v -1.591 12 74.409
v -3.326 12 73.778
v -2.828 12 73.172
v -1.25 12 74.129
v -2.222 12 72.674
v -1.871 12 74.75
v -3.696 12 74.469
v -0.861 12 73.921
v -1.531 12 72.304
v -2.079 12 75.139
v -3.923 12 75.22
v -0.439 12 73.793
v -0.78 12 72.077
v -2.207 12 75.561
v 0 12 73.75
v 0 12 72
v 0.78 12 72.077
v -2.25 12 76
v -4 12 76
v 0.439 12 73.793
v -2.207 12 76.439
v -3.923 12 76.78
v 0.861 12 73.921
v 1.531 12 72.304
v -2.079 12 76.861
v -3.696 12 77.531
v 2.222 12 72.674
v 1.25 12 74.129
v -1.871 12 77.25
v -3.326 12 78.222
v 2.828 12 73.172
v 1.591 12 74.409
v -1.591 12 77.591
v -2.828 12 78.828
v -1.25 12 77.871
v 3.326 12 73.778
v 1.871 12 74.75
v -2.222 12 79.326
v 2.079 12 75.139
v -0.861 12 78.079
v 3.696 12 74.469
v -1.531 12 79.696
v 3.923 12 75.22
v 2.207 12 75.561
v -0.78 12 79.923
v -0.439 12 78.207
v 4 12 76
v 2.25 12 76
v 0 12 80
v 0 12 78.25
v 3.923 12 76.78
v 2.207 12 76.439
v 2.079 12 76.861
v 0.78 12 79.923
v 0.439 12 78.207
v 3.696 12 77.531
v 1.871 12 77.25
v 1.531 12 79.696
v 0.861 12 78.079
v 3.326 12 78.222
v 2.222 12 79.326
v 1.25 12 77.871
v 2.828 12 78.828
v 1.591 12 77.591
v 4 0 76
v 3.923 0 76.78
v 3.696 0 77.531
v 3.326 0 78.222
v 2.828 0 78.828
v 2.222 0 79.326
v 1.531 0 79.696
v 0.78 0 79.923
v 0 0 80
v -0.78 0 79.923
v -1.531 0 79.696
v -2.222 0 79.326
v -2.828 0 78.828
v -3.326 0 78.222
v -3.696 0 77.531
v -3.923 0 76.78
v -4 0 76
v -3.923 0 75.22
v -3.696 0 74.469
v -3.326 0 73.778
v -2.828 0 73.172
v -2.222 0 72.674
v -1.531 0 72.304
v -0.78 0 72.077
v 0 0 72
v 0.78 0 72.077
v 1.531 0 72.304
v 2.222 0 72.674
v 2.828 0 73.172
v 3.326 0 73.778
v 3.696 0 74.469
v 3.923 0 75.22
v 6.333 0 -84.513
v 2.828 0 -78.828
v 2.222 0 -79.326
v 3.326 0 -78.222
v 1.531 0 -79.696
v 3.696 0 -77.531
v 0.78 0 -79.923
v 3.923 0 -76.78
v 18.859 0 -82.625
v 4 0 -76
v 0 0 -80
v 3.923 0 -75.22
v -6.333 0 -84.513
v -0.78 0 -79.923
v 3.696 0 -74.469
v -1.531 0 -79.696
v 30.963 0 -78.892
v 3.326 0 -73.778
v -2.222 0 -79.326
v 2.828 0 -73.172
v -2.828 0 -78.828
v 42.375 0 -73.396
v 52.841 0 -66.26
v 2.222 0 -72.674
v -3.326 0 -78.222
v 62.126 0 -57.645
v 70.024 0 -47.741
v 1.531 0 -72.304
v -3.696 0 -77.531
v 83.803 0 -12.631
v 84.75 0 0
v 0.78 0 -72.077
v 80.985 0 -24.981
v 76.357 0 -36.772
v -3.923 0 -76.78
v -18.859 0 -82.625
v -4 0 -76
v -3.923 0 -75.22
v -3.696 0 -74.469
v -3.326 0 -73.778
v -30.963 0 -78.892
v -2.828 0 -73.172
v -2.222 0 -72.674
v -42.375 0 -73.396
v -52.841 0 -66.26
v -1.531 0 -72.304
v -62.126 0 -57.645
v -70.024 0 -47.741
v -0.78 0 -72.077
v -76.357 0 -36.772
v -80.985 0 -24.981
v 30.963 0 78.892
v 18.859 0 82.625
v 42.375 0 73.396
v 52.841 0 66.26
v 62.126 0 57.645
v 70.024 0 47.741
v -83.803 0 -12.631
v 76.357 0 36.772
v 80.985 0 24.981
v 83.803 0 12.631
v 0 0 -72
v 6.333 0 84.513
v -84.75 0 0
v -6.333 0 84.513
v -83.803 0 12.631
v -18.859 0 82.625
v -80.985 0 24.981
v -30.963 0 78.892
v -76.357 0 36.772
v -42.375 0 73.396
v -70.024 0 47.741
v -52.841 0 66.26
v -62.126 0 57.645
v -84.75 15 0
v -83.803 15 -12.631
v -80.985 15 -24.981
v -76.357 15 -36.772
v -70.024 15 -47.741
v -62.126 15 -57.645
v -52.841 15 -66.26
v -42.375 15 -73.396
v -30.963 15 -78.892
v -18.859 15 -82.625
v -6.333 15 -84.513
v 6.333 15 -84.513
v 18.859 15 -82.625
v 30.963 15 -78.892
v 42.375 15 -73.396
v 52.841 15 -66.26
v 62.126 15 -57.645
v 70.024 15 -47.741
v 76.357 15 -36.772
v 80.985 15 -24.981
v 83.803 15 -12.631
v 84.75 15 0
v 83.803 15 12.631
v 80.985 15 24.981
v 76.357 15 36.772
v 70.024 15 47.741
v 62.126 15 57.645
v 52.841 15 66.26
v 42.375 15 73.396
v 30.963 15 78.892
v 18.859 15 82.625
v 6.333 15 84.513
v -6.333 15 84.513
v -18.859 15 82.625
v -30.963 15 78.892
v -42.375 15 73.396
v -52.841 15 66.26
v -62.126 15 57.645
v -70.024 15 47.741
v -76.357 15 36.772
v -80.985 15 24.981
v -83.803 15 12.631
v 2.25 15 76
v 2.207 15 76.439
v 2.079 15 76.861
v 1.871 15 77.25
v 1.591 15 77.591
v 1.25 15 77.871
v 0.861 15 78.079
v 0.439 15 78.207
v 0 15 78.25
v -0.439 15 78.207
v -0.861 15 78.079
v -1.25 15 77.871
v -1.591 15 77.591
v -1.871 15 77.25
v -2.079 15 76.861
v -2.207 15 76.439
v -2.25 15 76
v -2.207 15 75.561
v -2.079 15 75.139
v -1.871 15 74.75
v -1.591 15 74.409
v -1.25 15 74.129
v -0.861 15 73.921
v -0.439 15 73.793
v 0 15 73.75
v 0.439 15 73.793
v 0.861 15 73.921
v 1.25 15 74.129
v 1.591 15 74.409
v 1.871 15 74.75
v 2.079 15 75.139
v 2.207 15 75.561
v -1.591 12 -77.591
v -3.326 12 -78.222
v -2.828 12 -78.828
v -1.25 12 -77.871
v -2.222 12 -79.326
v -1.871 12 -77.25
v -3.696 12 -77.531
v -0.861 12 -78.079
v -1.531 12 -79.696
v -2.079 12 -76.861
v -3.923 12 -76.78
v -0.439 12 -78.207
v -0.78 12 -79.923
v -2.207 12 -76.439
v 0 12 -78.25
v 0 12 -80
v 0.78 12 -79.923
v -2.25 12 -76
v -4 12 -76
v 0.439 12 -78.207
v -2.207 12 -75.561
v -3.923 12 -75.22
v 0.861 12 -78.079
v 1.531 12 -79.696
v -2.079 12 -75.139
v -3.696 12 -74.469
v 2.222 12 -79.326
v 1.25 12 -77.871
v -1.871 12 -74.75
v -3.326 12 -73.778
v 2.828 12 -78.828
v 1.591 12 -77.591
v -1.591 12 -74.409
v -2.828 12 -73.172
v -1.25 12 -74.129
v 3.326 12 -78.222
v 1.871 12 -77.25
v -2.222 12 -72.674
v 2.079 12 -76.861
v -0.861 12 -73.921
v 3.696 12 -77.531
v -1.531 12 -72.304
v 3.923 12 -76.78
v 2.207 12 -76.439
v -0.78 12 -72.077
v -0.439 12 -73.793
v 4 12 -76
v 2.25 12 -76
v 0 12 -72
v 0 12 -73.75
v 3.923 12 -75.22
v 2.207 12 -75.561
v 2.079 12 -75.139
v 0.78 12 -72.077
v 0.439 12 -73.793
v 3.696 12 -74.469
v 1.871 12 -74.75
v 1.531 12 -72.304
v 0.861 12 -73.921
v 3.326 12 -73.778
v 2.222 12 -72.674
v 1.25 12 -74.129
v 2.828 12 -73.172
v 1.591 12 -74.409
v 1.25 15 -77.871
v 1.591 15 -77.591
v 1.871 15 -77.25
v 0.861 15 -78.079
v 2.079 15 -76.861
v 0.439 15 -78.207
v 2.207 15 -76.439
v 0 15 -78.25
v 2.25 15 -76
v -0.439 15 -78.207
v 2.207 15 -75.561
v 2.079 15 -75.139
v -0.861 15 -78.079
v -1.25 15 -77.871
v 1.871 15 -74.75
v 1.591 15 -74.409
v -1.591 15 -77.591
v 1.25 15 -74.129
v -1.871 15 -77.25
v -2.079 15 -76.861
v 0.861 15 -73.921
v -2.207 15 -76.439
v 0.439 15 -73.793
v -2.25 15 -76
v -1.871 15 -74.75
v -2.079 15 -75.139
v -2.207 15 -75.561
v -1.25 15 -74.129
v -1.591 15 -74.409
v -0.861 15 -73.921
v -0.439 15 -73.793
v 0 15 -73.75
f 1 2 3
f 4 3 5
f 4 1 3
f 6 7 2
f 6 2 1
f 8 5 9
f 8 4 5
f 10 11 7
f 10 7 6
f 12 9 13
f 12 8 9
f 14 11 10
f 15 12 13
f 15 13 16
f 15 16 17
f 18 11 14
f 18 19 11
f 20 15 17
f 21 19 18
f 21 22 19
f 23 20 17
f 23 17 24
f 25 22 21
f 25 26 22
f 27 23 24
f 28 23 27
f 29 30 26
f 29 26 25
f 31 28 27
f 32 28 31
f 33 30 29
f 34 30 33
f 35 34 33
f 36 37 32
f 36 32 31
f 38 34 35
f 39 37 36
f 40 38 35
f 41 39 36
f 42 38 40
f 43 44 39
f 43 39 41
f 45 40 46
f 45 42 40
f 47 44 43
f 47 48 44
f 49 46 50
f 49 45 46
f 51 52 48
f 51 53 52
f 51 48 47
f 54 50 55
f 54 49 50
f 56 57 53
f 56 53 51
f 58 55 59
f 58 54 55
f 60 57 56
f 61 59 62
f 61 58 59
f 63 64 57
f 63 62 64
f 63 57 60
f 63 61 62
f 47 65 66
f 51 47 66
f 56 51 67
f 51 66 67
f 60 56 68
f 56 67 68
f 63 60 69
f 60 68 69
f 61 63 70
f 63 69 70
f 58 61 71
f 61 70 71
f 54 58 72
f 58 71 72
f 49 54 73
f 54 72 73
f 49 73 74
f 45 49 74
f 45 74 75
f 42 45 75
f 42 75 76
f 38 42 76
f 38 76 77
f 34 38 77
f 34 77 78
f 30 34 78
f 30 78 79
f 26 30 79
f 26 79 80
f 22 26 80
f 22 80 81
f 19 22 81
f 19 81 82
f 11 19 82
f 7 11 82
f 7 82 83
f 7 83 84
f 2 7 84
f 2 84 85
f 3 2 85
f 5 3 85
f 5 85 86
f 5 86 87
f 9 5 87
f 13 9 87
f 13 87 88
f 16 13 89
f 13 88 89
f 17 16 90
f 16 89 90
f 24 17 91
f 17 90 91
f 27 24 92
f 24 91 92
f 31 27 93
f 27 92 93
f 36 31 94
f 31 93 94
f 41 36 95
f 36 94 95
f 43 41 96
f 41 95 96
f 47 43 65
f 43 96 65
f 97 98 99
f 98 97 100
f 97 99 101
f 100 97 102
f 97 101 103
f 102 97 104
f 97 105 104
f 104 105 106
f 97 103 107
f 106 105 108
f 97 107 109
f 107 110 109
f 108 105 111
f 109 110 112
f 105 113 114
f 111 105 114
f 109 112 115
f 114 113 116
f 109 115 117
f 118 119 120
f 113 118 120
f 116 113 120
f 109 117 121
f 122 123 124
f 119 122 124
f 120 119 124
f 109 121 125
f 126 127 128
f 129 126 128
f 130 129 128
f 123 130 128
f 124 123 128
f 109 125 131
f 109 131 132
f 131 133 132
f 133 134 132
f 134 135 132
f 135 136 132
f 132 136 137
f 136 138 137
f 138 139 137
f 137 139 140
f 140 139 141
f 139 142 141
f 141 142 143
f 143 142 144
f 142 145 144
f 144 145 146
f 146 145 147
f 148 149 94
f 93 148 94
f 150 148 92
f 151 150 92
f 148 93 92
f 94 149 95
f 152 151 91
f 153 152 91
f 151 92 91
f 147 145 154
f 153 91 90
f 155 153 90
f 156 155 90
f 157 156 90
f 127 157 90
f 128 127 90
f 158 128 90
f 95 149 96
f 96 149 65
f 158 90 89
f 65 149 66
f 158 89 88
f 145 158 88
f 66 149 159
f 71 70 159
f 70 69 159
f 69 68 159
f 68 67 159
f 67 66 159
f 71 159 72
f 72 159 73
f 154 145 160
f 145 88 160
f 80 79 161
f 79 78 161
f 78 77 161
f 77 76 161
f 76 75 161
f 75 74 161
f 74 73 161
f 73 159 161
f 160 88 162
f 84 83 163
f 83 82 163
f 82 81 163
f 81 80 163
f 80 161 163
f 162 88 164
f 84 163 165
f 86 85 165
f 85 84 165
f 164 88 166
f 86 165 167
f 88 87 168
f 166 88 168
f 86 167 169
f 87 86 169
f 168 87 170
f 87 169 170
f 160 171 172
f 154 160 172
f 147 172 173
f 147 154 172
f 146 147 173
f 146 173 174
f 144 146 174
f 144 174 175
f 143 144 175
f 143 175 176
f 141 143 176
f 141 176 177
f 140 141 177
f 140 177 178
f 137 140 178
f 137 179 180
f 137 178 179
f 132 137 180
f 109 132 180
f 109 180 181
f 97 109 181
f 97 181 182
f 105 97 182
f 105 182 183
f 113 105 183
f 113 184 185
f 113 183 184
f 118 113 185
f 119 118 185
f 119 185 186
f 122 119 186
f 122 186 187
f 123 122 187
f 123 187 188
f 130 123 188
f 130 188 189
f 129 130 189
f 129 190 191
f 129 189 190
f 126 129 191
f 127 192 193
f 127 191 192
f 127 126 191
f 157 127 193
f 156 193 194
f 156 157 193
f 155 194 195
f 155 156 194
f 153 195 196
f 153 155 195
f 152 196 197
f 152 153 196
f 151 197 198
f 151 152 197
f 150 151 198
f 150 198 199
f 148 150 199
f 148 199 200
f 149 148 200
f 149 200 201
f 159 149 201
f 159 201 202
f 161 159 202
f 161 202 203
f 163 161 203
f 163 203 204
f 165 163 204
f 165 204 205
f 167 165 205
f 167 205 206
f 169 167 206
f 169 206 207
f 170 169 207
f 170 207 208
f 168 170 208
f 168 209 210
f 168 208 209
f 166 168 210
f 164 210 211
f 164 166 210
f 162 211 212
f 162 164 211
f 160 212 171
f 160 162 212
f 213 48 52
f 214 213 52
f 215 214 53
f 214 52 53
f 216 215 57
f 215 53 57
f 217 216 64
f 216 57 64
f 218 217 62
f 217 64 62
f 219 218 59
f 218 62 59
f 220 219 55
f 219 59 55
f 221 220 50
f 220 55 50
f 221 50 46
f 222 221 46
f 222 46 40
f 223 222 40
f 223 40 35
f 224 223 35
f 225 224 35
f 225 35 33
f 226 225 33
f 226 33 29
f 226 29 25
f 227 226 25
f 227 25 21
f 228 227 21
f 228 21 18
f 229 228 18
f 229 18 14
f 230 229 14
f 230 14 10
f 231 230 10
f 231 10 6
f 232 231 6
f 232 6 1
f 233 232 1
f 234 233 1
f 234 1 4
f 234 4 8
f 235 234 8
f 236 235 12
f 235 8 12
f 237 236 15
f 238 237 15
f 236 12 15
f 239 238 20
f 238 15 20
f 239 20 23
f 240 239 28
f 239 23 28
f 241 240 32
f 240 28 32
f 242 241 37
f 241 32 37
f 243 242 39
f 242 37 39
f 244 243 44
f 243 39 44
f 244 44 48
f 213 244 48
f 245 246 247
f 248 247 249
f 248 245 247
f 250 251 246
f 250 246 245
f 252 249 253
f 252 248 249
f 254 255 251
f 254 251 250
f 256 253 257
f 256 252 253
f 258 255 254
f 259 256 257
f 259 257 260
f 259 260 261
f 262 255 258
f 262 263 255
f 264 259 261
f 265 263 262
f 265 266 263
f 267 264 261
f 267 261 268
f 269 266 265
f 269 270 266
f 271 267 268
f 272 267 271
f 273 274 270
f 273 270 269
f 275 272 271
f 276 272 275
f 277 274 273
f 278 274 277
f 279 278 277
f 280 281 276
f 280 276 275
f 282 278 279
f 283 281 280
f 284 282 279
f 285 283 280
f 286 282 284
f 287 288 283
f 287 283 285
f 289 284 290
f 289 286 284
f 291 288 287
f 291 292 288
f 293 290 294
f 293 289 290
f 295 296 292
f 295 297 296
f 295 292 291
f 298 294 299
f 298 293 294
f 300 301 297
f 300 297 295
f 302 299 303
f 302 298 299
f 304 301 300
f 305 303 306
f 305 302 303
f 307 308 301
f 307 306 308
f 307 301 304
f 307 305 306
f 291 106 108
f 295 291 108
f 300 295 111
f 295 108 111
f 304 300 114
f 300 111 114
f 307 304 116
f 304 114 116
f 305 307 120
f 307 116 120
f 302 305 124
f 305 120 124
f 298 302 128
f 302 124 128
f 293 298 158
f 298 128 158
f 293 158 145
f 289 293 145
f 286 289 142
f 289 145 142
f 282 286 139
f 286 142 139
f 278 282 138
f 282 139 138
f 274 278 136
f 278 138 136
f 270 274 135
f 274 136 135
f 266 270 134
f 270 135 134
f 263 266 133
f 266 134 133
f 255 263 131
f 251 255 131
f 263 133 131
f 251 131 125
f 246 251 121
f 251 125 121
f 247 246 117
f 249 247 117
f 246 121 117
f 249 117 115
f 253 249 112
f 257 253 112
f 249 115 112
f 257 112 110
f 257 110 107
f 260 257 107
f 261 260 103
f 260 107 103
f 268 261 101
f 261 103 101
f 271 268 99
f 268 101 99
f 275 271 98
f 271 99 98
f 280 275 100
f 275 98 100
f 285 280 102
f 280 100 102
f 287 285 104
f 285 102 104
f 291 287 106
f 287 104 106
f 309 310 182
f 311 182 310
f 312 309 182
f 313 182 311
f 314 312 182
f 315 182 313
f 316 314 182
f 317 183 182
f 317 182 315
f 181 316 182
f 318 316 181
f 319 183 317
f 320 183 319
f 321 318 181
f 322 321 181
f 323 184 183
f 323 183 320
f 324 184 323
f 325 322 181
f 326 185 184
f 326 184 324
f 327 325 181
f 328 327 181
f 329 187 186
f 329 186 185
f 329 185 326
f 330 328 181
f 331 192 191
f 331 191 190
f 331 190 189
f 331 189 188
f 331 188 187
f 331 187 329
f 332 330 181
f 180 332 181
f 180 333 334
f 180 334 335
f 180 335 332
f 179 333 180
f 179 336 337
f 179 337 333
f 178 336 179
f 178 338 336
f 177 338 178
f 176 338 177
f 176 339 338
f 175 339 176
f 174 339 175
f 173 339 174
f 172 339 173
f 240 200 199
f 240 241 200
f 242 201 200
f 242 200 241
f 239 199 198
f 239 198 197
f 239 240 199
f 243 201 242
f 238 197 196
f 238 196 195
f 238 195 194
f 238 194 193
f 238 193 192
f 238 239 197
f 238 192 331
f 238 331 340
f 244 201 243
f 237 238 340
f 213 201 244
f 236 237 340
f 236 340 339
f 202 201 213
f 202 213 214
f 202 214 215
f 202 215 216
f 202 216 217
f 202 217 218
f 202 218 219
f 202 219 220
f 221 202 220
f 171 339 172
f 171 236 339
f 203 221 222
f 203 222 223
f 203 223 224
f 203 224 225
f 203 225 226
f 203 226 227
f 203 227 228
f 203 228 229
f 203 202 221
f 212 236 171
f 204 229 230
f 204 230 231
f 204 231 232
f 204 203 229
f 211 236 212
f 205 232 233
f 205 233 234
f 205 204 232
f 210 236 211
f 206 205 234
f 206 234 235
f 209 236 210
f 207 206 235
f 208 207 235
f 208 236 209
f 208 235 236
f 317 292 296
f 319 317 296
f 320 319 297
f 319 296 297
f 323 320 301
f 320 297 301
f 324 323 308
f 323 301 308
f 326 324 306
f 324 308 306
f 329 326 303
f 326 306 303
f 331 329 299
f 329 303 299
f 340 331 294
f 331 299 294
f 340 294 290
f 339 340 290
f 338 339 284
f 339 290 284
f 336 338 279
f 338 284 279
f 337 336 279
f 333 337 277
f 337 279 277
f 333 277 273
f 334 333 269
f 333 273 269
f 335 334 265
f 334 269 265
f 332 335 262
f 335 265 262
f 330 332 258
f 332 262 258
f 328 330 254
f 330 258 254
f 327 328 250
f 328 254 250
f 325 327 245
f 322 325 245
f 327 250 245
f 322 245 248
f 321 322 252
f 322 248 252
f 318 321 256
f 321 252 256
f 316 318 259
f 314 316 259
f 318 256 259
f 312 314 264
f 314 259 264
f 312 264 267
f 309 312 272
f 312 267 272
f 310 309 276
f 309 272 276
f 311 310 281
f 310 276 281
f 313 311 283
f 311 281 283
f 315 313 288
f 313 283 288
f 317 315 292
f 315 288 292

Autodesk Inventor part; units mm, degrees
ref_plane "YZ Plane" through (0, 0, 0) normal (1, 0, 0) x (0, 1, 0)
ref_plane "XZ Plane" through (0, 0, 0) normal (0, 1, 0) x (-1, 0, 0)
ref_plane "XY Plane" through (0, 0, 0) normal (0, 0, 1) x (1, 0, 0)
sketch "Sketch1" plane through (0, 0, 0) normal (0, 1, 0) x (-1, 0, 0)
  circle A0 centre (0, 0) radius 84.75
  dimension "d0" = 169.5
extrude "Extrusion1" add sketch "Sketch1" along normal blind 15
sketch "Sketch2" plane through (0, 0, 0) normal (0, -1, 0) x (1, 0, 0)
  circle A0 centre (0, 0) radius 76
  circle A1 centre (0, 76) radius 4
  circle A2 centre (0, -76) radius 4
  circle A3 centre (0, 76) radius 2.25
  circle A4 centre (0, -76) radius 2.25
  dimension "d3" = 152
  dimension "d4" = 8
  dimension "d5" = 8
  dimension "d6" = 4.5
  dimension "d7" = 4.5
extrude "Extrusion2" cut sketch "Sketch2" against normal through all contours A3 A0 | A0 A3 | A4 A0 | A0 A4
extrude "Extrusion3" cut sketch "Sketch2" against normal blind 12 contours A1 A0 A3 | A0 A3 A1 | A2 A0 A4 | A0 A4 A2 | A3 A0 | A0 A3 | A4 A0 | A0 A4
properties part number "substrate plate"
